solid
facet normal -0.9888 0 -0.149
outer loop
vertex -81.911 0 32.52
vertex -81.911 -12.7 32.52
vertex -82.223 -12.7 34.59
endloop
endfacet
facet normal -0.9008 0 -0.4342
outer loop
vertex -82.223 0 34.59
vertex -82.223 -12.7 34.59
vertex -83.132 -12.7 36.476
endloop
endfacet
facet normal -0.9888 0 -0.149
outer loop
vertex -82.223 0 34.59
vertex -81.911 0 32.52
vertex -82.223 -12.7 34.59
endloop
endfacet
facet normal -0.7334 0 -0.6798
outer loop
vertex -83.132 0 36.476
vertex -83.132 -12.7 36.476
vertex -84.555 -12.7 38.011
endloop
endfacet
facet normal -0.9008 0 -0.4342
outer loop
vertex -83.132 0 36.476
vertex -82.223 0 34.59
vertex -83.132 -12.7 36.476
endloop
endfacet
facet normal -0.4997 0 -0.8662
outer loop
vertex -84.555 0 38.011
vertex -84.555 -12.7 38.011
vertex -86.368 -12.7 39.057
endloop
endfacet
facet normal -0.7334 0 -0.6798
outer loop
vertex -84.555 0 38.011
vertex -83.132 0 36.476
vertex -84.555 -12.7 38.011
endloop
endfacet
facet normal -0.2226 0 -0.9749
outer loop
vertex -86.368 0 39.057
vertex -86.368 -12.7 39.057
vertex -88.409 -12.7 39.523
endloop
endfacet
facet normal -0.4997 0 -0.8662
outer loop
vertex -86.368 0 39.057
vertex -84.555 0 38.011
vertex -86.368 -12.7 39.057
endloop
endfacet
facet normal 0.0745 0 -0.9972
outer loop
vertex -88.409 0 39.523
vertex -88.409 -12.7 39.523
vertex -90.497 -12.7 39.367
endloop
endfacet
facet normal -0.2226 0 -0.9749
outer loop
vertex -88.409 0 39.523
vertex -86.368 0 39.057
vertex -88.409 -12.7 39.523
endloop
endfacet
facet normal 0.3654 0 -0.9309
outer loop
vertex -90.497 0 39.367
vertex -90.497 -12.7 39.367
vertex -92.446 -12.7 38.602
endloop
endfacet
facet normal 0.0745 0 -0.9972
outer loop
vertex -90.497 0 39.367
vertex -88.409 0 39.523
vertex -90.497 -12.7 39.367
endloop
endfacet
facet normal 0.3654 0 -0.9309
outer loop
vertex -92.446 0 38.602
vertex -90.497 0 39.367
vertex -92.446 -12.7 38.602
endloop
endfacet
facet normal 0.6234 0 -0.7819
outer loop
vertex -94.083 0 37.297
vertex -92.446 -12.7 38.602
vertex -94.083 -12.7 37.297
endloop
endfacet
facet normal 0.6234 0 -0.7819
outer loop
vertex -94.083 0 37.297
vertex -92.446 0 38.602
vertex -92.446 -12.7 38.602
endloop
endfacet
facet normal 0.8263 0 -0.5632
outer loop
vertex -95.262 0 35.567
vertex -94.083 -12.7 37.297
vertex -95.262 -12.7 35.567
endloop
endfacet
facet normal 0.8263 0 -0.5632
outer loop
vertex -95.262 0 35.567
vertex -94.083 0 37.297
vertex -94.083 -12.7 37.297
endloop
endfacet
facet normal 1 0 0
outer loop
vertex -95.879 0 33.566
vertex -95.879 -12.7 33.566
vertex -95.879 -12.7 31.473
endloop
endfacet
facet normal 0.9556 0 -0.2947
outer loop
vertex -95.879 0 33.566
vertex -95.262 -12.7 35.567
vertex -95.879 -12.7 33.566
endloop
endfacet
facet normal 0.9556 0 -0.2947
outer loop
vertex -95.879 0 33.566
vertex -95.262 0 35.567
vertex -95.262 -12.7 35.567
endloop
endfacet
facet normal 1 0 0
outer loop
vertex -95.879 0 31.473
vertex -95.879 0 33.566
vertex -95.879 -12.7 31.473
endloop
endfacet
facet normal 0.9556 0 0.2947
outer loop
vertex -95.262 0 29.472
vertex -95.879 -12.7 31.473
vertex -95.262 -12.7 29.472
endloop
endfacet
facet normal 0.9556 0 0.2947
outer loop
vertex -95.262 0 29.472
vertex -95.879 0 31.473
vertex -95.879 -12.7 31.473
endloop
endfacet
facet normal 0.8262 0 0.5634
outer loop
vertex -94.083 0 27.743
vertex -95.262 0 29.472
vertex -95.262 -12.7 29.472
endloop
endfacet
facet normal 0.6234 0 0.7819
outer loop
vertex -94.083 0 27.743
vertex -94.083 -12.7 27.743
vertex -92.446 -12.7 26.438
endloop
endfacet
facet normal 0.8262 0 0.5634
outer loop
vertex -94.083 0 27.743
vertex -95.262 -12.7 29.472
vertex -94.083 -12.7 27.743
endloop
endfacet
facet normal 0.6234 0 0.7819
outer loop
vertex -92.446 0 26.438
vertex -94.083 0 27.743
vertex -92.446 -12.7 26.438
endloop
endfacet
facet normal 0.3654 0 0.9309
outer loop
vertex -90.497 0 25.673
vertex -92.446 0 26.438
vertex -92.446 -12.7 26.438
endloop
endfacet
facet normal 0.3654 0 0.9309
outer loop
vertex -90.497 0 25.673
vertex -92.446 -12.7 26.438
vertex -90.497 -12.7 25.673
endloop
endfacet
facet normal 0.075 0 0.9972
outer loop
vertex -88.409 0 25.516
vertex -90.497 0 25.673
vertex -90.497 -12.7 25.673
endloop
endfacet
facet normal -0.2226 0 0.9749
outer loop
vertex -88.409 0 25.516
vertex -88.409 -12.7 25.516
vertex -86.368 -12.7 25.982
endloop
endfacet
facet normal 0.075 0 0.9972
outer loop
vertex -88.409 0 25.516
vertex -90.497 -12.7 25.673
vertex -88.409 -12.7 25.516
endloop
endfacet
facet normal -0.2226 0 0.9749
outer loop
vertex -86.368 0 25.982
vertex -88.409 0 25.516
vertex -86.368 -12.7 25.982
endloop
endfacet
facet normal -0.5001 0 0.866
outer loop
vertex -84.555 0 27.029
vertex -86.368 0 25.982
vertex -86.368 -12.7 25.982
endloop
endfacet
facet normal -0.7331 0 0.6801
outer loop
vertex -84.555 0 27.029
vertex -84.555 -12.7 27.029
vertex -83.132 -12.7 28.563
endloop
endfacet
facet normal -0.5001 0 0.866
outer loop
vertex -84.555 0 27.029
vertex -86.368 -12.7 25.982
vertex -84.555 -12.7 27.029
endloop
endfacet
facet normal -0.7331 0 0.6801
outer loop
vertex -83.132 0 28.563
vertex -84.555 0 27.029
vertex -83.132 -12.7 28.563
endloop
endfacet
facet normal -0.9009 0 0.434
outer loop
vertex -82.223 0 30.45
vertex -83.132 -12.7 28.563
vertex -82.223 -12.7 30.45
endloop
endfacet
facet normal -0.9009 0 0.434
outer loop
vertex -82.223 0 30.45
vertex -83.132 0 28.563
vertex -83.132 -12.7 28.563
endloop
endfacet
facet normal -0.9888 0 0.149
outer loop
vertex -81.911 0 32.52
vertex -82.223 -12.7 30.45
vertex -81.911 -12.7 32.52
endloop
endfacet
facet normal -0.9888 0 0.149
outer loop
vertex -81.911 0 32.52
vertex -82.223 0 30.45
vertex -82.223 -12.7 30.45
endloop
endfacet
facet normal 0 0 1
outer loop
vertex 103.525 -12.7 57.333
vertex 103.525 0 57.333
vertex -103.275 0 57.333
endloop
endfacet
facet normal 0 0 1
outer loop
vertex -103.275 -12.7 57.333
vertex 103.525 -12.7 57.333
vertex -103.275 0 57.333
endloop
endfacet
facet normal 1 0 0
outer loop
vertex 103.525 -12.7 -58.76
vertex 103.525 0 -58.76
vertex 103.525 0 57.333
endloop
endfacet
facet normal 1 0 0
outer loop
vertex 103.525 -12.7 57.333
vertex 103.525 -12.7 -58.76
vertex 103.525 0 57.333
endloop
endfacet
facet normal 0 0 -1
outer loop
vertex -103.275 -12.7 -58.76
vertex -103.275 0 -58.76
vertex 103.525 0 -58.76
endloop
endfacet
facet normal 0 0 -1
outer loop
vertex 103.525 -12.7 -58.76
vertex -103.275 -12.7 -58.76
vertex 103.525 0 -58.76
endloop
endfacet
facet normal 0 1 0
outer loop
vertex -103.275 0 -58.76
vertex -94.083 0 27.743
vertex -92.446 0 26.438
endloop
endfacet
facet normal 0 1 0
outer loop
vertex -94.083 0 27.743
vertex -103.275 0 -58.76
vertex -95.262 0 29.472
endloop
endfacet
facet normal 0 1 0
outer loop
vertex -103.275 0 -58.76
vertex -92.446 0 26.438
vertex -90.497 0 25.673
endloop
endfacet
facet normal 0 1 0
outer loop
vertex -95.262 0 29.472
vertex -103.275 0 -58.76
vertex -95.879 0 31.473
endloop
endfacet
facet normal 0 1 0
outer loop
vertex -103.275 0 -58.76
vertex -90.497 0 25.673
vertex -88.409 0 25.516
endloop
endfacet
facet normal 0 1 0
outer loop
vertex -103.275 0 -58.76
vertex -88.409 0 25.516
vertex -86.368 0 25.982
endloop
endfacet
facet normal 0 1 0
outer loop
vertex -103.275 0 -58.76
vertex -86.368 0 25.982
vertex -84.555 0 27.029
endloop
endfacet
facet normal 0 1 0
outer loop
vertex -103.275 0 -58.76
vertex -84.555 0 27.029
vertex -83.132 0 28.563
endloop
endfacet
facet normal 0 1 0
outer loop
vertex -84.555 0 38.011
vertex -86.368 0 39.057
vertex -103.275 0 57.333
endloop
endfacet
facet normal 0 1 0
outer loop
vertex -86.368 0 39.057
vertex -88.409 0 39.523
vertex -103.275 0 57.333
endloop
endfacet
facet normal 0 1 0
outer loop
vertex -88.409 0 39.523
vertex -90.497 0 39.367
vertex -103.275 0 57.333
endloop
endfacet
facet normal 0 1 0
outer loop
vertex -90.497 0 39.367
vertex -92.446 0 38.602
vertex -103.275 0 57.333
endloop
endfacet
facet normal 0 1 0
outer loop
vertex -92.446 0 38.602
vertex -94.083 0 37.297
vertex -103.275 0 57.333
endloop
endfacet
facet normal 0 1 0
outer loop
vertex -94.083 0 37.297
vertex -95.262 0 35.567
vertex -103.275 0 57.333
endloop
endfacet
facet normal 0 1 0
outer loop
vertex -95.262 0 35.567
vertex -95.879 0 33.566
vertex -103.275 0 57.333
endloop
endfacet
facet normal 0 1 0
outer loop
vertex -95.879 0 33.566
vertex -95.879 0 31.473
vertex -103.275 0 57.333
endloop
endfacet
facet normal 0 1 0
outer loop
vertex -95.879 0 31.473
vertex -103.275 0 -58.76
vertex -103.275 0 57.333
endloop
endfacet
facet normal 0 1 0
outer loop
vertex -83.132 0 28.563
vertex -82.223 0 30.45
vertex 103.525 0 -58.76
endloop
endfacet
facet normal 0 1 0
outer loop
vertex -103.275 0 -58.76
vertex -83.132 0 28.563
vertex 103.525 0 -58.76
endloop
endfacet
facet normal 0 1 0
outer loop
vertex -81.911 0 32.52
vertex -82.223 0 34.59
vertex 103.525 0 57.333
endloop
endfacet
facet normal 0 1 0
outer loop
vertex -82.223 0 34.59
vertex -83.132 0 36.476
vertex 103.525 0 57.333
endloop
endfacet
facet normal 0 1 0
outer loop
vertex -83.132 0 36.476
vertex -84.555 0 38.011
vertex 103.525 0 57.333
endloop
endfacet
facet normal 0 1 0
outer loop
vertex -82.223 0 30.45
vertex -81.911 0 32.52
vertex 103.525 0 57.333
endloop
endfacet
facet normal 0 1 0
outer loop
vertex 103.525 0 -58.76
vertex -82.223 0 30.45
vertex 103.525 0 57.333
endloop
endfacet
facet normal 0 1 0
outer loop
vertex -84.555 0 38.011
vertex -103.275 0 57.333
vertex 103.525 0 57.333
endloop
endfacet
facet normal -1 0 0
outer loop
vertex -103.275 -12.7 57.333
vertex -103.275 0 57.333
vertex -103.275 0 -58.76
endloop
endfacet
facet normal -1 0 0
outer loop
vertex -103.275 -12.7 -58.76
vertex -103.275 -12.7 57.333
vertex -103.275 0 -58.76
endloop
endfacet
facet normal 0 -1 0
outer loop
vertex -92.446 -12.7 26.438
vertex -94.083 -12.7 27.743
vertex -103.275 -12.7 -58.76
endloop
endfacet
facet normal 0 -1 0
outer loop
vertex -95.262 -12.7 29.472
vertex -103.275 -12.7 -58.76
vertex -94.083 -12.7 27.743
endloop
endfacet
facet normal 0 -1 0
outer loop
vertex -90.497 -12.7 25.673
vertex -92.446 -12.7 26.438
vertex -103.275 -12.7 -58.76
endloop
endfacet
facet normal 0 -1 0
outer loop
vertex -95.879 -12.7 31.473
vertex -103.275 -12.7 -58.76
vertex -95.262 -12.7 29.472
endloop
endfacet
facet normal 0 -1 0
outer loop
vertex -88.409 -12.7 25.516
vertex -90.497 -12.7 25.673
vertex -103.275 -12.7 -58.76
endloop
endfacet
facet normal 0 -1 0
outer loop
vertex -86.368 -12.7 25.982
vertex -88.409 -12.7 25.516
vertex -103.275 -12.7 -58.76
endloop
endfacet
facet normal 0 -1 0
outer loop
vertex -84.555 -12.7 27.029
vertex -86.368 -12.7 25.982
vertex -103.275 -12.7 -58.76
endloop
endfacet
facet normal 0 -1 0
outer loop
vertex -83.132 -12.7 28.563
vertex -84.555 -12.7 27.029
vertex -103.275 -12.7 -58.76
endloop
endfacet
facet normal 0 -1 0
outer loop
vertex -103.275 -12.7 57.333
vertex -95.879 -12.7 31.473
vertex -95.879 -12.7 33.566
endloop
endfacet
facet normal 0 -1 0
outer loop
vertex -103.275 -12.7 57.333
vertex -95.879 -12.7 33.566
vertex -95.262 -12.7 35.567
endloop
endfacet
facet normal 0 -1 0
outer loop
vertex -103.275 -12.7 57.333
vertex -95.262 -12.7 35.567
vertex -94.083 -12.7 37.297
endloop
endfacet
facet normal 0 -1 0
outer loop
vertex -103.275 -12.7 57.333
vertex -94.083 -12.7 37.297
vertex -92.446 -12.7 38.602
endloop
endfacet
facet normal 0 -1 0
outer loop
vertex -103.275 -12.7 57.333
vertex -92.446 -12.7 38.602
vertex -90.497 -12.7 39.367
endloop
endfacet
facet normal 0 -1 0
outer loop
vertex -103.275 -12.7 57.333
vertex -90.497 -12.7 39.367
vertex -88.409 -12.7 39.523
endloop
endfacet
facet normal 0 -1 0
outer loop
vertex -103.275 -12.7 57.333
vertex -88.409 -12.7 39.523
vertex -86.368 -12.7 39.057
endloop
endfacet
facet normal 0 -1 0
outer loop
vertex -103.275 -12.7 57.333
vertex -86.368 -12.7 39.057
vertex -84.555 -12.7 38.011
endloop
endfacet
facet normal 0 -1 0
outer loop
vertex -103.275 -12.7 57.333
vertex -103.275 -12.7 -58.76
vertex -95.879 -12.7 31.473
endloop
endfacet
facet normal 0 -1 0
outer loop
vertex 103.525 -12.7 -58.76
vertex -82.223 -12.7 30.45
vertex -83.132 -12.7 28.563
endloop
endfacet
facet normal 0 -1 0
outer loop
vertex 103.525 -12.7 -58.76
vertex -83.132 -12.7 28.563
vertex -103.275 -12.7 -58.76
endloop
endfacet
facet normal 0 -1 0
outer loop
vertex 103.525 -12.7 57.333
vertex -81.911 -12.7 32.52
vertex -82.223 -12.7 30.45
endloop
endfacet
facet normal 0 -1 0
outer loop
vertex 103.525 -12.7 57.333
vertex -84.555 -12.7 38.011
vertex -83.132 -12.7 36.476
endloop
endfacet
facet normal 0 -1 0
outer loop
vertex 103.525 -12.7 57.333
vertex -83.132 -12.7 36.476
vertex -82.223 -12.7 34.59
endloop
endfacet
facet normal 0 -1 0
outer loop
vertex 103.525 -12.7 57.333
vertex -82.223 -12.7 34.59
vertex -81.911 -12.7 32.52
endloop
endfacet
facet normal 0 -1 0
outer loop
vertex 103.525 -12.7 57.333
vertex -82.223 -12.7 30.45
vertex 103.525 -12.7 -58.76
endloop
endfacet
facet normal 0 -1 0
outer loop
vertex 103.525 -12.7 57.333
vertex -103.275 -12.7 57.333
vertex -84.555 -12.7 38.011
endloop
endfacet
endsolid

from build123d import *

# Parameters (mm, degrees)
F1_W     = 5.1343291998
F1_H     = 4.8490911722
F2_DEPTH = 12.7
F0_R     = 7.0231
F3_DEPTH = 25.4


with BuildPart() as f2:
    # F1 (on Front) → F2 (new body)
    with BuildSketch(Plane.XZ):
        Polygon((103.5248413682, 57.333368808), (-103.27462852, 57.333368808), (-103.27462852, -58.7595701218), (103.5248413682, -58.7595701218), (103.5248413682, -58.4743283689), (98.3905121684, -58.4743283689), (98.3905121684, -53.6252371967), (103.5248413682, -53.6252371967), align=None)
        with Locations((100.9576767683, -56.0497827828)):
            Rectangle(F1_W, F1_H)
    extrude(amount=F2_DEPTH)

    # F0 (on Front) → F3 (cut)
    with BuildSketch(Plane.XZ):
        with Locations((-88.9342725277, 32.5196869671)):
            Circle(F0_R)
    extrude(amount=F3_DEPTH, mode=Mode.SUBTRACT)


solid = f2.part
